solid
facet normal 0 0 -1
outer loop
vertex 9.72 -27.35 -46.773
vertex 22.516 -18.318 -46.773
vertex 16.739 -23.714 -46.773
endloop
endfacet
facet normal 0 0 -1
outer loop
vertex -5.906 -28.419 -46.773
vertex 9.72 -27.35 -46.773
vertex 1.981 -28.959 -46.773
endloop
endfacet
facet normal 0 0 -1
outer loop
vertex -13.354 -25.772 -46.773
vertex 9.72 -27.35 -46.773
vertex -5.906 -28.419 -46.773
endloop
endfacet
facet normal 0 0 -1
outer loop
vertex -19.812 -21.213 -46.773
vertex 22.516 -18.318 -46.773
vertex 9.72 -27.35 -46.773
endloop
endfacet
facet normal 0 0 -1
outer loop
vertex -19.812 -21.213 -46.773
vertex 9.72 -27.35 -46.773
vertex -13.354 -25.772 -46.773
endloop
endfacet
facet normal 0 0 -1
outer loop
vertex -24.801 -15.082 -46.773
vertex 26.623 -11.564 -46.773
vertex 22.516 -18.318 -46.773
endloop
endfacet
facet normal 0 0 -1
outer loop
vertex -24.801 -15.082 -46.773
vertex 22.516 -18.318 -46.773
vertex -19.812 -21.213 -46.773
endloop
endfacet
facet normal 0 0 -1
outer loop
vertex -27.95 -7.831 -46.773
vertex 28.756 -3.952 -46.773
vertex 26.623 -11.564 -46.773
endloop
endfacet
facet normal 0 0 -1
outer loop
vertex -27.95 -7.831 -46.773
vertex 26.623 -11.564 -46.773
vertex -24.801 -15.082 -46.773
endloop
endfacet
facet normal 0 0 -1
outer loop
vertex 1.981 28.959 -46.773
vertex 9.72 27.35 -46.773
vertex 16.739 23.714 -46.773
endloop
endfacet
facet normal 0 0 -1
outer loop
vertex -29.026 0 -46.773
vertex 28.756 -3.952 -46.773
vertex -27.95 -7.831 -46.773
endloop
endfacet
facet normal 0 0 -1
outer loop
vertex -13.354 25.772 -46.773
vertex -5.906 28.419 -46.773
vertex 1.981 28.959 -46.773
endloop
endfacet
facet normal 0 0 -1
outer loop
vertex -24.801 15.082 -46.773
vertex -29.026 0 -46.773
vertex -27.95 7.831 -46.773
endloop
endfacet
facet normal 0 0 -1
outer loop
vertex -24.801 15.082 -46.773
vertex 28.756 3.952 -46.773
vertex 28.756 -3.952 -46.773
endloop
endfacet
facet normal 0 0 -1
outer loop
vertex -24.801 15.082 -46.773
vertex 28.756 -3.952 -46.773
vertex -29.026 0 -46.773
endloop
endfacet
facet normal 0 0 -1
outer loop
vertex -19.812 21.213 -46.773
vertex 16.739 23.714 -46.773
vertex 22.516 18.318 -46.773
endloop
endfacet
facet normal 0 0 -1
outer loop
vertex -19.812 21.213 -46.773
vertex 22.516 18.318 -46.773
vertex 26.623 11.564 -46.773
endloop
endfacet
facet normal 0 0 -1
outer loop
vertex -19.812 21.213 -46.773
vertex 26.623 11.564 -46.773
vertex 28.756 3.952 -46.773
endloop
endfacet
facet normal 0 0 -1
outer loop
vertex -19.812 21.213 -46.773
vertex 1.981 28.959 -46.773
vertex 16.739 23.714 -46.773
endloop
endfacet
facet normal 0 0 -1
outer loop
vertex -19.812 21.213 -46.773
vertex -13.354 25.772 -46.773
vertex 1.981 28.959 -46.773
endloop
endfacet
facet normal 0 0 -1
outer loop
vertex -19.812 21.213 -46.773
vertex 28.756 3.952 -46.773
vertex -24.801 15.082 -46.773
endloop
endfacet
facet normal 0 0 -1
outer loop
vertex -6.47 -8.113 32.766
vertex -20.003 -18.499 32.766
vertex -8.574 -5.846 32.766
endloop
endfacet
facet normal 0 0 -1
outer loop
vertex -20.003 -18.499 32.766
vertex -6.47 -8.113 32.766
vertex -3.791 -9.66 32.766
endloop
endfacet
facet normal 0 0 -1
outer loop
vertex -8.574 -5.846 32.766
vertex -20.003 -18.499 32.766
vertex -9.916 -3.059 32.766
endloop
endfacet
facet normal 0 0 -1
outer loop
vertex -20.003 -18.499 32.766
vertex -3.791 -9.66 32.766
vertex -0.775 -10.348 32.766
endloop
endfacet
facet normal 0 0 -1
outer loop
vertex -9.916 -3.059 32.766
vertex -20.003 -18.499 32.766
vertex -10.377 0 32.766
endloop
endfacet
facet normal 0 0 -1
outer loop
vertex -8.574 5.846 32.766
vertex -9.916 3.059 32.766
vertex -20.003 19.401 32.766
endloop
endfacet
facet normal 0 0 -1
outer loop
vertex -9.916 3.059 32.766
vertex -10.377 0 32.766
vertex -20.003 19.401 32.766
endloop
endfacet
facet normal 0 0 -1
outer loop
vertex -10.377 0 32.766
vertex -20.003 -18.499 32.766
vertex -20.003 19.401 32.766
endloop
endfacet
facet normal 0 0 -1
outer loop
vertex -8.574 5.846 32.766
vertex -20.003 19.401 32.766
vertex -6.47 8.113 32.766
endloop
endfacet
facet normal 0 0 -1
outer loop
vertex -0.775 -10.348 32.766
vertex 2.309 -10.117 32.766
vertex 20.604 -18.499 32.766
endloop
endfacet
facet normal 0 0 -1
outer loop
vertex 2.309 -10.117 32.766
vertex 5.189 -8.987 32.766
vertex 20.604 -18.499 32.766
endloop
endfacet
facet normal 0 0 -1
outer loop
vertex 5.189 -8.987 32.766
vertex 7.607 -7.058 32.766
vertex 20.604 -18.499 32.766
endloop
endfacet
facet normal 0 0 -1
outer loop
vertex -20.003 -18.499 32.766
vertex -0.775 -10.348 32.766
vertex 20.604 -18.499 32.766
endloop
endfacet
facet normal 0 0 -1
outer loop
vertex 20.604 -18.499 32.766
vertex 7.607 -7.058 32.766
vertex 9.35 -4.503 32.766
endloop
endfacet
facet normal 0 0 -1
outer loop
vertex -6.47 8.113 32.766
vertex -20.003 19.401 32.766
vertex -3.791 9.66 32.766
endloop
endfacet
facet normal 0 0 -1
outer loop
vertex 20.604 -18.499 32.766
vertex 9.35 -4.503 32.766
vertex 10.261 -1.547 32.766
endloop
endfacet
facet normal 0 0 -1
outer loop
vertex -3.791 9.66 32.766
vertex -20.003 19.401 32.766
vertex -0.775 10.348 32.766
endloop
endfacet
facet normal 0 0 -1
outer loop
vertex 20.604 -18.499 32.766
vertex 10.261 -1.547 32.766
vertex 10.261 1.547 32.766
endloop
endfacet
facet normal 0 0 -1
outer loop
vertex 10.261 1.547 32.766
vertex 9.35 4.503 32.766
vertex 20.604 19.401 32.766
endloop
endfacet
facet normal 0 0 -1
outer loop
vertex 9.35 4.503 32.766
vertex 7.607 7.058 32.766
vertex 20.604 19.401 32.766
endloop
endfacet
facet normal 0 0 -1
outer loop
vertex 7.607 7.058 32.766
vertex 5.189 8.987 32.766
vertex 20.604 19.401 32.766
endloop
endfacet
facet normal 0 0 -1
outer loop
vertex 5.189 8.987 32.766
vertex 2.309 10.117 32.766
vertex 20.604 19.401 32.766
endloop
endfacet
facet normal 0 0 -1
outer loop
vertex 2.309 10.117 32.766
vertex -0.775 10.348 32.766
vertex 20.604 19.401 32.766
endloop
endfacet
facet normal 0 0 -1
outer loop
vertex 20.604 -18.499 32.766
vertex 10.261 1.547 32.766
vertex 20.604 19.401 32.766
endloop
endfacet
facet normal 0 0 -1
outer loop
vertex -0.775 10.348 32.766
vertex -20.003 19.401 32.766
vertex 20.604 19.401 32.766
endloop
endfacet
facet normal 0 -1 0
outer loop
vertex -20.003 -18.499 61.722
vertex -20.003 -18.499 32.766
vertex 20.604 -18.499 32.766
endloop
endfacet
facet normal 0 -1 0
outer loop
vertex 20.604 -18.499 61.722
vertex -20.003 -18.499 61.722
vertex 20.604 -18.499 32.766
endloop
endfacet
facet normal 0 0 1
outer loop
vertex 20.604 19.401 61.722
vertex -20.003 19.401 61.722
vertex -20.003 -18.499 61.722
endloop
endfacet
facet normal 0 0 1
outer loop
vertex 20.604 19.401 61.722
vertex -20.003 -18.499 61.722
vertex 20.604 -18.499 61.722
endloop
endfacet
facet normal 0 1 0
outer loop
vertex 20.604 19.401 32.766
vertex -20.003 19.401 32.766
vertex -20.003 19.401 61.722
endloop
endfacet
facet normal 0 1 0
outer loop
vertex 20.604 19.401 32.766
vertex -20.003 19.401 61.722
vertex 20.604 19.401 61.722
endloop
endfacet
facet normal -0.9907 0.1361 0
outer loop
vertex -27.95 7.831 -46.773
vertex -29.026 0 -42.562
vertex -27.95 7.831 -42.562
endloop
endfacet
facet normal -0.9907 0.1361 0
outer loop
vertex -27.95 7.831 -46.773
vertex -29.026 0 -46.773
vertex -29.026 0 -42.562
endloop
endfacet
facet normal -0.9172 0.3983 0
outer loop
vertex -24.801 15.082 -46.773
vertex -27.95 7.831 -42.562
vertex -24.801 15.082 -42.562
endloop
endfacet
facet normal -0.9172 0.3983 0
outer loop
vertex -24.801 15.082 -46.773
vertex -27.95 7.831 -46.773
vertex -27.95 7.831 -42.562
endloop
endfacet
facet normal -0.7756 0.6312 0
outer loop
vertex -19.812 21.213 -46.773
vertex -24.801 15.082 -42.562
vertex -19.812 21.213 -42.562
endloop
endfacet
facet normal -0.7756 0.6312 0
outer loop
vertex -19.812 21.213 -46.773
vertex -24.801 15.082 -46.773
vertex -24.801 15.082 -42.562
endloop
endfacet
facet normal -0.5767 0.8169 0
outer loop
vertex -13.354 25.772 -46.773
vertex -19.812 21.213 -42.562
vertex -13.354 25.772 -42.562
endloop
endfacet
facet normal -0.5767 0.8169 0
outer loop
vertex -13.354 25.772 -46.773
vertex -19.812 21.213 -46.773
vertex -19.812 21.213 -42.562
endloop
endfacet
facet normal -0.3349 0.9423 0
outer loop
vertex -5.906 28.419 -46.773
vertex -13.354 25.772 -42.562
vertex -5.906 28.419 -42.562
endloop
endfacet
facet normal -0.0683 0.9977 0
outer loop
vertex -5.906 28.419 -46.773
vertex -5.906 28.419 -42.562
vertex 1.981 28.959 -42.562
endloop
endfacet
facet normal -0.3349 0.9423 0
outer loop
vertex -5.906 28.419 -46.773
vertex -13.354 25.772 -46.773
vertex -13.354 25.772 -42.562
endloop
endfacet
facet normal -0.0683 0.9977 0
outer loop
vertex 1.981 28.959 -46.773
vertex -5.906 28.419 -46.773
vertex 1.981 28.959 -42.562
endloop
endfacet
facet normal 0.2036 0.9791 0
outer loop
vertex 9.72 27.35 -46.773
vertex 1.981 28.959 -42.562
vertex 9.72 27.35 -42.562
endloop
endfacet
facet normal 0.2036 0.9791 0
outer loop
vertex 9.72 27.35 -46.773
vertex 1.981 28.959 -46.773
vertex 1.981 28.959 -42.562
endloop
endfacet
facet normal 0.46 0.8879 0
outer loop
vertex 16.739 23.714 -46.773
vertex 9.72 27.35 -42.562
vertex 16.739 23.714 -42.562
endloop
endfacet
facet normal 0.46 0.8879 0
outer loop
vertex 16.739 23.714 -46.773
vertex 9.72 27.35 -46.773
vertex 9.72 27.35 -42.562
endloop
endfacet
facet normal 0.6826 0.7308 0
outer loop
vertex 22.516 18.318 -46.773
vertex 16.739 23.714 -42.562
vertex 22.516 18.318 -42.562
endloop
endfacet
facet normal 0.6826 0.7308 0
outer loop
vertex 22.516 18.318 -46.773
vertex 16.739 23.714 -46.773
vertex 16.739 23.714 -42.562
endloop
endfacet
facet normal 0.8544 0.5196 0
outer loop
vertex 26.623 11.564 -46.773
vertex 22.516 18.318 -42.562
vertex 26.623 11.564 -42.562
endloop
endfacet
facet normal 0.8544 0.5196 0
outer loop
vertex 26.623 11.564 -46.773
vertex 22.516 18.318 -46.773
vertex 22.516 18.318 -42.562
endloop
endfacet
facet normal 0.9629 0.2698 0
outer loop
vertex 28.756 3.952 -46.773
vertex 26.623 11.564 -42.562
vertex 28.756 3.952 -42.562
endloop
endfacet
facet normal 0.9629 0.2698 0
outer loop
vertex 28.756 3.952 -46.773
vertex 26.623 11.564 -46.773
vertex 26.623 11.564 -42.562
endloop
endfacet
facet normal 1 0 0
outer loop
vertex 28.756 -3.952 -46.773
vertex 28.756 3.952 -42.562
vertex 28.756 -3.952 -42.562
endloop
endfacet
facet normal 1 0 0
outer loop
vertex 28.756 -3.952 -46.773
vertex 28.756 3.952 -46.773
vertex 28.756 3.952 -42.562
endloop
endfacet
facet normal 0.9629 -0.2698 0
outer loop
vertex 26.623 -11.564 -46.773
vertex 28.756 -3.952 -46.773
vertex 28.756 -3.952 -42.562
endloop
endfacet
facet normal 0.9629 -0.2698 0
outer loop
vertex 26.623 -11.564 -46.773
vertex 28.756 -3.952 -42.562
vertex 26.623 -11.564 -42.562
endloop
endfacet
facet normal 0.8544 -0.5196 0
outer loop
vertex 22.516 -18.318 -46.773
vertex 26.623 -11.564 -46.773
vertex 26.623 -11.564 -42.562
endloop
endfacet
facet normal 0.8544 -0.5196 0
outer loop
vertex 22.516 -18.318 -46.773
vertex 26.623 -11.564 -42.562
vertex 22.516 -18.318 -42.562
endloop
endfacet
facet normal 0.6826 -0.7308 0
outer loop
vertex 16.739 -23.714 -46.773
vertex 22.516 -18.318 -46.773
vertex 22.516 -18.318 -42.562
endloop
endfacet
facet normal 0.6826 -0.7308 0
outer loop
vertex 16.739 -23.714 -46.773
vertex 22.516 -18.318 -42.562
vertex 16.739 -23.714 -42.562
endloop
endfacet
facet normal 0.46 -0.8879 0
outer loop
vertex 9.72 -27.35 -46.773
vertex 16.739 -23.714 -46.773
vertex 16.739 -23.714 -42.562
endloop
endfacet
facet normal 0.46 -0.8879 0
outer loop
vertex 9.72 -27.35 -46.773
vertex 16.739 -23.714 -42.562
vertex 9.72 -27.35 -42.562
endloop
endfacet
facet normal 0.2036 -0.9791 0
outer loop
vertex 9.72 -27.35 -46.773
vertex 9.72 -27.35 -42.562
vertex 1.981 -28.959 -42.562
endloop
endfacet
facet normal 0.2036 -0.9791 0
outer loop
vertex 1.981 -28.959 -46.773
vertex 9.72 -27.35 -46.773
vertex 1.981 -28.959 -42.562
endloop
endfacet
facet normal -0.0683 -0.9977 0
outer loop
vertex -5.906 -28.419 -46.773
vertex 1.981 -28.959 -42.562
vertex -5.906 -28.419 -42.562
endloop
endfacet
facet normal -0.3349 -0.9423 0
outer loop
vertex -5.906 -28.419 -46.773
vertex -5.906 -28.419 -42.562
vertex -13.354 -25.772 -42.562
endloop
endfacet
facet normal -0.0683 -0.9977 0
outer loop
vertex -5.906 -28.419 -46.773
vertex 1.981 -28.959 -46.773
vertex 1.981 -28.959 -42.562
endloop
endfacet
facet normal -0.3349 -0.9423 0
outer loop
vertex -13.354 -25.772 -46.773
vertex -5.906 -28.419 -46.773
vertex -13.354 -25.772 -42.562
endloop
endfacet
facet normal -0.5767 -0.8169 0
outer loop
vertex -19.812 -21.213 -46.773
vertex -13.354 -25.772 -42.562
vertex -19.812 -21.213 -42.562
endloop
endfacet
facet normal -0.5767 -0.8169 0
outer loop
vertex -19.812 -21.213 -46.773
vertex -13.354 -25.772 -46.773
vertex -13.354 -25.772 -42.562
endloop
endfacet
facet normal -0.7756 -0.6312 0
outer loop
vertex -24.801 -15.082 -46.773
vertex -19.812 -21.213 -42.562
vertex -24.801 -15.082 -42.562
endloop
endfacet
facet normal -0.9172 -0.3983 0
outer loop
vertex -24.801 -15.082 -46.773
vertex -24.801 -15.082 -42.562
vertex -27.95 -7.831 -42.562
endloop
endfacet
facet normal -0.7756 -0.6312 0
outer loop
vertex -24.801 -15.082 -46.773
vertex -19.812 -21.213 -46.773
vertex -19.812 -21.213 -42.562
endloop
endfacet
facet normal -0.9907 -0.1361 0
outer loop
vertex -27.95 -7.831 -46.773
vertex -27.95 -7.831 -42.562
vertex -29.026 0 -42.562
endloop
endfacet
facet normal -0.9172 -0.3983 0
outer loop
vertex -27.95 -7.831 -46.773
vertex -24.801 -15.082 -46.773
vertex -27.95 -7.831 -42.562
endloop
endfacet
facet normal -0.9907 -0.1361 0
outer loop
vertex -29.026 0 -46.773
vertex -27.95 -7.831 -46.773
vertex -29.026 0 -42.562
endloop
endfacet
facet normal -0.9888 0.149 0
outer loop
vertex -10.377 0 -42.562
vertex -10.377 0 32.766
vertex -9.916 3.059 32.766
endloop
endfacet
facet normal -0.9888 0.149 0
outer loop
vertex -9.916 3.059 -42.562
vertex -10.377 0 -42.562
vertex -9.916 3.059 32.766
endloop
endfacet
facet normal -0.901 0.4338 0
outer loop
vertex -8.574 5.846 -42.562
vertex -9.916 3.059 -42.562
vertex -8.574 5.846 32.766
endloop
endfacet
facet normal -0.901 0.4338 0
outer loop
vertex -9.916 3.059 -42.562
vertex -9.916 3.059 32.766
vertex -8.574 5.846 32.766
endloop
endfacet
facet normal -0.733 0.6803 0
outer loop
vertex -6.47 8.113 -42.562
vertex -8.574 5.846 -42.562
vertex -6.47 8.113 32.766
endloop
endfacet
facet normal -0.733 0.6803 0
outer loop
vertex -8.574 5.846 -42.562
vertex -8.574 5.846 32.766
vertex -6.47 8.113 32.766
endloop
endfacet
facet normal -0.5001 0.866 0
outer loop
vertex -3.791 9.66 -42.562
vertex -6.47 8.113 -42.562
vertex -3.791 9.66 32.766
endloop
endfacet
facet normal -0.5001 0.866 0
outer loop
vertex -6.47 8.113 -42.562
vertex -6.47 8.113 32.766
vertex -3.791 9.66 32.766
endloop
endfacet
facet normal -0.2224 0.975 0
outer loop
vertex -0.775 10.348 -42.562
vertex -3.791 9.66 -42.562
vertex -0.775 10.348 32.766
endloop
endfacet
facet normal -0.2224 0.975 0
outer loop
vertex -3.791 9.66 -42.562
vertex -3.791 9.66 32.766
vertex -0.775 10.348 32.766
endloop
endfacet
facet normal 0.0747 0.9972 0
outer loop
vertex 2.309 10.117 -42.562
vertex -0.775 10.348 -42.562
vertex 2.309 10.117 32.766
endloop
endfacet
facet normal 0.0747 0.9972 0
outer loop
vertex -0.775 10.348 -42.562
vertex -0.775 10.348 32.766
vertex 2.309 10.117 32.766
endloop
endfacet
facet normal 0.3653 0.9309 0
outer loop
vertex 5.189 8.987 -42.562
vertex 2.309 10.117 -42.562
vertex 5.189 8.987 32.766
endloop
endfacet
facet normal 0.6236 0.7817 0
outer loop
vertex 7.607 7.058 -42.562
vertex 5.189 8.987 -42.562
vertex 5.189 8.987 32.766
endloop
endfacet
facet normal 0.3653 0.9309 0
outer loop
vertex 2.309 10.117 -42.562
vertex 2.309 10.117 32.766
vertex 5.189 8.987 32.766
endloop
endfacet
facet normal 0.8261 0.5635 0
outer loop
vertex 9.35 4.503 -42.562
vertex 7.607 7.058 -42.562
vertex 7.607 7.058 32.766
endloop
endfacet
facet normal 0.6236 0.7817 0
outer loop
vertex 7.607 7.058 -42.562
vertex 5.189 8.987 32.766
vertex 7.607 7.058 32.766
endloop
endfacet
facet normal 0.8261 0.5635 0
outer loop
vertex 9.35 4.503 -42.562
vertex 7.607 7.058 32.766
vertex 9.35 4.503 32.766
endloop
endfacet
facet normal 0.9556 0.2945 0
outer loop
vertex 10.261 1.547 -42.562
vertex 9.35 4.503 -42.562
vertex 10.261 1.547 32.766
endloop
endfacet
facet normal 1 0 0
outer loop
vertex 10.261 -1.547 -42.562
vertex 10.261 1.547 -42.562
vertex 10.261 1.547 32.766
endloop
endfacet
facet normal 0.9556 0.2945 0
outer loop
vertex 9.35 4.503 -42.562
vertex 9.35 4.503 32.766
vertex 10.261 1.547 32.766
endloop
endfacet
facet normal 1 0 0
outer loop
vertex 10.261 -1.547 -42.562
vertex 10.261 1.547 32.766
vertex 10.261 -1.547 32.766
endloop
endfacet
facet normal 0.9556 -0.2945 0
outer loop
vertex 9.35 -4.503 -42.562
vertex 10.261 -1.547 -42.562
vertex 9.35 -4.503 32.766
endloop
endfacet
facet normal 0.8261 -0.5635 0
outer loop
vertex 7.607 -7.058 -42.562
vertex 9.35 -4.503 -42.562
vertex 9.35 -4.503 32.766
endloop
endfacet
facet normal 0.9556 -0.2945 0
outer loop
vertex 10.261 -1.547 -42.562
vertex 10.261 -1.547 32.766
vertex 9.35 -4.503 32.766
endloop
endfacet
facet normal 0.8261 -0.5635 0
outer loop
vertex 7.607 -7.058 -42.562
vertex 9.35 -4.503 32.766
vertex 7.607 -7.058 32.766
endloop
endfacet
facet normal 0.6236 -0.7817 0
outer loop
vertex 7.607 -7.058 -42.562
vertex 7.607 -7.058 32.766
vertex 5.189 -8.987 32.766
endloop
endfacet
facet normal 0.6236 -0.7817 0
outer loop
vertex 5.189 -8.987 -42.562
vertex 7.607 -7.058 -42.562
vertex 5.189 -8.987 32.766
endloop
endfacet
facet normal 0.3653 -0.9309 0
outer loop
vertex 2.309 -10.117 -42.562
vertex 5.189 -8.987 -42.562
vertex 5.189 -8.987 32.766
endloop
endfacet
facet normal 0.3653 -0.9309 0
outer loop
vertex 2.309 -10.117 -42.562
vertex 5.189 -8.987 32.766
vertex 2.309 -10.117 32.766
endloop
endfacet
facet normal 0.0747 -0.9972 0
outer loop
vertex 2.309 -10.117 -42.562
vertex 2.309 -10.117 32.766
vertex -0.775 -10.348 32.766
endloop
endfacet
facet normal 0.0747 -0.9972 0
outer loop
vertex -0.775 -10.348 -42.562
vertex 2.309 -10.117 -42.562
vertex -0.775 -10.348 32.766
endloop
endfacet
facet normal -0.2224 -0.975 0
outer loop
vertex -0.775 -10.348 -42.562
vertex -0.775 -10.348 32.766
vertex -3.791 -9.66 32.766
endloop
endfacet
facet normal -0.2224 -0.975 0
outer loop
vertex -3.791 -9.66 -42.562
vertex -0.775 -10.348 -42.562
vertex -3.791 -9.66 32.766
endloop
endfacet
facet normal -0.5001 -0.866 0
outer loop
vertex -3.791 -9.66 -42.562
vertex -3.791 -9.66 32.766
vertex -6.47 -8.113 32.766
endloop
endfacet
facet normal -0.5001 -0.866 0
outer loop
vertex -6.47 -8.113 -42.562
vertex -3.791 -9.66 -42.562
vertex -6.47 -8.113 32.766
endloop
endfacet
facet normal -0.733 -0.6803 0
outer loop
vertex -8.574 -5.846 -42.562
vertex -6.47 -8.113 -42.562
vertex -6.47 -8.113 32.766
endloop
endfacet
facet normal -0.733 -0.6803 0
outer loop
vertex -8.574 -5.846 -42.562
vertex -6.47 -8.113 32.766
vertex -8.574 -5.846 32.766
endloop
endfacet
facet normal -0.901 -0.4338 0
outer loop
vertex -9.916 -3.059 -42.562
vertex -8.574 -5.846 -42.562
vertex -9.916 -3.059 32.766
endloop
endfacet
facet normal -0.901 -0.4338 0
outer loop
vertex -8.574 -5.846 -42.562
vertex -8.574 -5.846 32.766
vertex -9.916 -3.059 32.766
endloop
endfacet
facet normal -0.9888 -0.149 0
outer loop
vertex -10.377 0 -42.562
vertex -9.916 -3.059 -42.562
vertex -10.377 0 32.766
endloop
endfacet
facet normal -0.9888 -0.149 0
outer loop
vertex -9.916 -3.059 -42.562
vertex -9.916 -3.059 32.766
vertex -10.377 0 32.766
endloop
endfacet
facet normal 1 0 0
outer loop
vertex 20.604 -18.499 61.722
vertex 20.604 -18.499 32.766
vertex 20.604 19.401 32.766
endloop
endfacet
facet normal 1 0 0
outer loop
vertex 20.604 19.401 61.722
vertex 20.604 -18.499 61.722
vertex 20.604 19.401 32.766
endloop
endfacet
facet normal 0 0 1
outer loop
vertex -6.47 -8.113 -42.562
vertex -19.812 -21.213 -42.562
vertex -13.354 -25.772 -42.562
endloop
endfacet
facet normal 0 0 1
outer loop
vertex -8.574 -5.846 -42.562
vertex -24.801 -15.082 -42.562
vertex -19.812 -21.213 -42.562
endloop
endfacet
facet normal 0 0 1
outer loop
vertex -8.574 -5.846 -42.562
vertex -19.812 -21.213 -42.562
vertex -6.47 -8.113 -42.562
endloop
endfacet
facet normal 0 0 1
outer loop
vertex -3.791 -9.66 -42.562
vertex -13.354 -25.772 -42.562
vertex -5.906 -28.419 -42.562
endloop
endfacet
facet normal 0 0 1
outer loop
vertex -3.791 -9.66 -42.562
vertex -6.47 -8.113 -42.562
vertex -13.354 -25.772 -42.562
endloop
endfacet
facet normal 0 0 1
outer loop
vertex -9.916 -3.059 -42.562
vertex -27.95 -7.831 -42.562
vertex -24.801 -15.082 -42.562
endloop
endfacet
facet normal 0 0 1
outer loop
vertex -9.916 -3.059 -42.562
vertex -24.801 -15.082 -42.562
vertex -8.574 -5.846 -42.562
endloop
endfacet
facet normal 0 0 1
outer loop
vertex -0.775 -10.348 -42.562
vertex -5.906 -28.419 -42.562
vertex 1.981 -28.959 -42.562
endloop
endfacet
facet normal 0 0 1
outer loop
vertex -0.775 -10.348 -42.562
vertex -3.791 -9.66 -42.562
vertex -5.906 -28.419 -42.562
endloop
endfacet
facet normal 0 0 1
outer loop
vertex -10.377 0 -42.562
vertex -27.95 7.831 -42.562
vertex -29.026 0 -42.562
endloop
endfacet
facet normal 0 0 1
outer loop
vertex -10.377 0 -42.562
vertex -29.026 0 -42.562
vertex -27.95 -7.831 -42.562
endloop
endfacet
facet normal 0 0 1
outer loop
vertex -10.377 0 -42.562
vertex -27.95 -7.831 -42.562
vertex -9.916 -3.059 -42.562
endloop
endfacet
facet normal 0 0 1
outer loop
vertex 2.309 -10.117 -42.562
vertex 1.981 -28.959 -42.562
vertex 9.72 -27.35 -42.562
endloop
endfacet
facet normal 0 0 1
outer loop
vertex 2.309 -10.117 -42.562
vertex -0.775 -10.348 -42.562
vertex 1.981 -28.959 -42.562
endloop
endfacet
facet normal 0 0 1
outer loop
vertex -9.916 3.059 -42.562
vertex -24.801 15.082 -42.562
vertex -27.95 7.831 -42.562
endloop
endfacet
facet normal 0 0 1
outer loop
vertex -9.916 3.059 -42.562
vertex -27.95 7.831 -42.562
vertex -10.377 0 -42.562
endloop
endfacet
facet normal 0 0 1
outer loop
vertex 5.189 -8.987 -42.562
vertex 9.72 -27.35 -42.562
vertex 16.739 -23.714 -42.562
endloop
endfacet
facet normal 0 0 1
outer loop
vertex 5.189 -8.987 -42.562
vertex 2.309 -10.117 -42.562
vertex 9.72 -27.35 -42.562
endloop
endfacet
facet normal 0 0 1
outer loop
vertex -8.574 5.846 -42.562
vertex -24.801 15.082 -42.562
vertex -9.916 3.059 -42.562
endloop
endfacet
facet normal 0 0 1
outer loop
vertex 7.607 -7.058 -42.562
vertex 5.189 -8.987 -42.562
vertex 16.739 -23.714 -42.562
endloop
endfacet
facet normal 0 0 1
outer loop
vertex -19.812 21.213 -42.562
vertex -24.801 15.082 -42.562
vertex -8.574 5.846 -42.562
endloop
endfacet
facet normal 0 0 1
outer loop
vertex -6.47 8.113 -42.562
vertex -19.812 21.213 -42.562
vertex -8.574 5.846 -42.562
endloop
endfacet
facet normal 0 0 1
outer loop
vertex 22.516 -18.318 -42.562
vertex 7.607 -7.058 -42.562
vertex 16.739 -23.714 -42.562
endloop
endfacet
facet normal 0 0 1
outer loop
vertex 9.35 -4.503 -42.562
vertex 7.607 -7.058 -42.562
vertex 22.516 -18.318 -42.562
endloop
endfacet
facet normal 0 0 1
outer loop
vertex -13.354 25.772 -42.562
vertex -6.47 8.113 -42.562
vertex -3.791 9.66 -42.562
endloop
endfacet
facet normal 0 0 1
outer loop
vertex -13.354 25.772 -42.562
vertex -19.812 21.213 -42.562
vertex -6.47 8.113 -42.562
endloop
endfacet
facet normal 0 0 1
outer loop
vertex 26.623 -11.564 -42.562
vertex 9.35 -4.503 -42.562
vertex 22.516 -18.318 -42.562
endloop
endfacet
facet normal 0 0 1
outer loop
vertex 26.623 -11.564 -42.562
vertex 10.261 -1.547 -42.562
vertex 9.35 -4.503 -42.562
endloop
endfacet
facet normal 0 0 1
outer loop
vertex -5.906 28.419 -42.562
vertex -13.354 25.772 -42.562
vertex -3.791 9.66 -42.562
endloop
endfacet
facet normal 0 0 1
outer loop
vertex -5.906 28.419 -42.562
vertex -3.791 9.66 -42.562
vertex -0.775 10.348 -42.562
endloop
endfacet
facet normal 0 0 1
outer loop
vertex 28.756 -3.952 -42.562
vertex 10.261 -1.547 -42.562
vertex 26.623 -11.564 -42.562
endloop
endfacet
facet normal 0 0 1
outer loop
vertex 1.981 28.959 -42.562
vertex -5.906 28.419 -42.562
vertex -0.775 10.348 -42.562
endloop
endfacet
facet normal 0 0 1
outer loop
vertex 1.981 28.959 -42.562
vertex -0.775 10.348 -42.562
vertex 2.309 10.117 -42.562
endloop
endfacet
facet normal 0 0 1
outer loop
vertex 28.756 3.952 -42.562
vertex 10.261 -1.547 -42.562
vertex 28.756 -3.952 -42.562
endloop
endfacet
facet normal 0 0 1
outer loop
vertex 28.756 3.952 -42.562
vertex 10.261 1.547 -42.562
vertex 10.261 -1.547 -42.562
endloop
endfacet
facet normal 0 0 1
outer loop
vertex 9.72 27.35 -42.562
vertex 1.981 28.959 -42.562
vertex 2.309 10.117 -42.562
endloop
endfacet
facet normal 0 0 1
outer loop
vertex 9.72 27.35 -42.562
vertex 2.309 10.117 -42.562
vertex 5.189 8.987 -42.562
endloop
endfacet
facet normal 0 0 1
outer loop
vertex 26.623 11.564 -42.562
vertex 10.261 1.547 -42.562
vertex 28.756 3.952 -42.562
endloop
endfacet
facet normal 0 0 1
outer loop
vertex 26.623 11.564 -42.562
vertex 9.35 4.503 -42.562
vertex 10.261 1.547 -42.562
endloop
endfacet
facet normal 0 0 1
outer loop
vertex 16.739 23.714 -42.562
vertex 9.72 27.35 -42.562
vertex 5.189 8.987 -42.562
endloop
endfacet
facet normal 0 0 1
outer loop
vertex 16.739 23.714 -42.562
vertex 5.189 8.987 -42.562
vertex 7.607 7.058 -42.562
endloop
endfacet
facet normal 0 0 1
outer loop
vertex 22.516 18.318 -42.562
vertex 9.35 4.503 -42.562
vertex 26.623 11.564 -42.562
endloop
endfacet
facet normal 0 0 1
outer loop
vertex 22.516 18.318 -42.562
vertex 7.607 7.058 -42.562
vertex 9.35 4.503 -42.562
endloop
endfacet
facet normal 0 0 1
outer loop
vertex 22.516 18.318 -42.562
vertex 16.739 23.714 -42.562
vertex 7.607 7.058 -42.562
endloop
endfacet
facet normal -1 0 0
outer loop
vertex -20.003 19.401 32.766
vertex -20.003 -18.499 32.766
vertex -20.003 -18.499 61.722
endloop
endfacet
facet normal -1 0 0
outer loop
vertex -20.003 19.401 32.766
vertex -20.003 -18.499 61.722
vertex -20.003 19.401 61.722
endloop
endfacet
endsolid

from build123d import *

# Parameters (mm, degrees)
F0_W     = 10.3772366419
F0_H     = 78.2052613795
F3_START = 32.766
F2_W     = 40.606578812
F2_H     = 37.899473682
F3_DEPTH = 28.956


with BuildPart() as f1:
    # F0 (on Front) → F1 (revolve)
    with BuildSketch(Plane.XZ):
        with Locations((-5.188618321, -3.4590791911)):
            Rectangle(F0_W, F0_H)
        Polygon((-29.026184231, -46.772763133), (0, -46.772763133), (0, -42.5617098808), (-10.3772366419, -42.5617098808), (-29.026184231, -42.5617098808), align=None)
    revolve(axis=Axis((0, 0, -3.4590791911), (0, 0, -1)))

    # F2 (on Top) → F3 (join)
    with BuildSketch(Plane.XY.offset(F3_START)):
        with Locations((0.3007883206, 0.4511838779)):
            Rectangle(F2_W, F2_H)
    extrude(amount=F3_DEPTH)


solid = f1.part
